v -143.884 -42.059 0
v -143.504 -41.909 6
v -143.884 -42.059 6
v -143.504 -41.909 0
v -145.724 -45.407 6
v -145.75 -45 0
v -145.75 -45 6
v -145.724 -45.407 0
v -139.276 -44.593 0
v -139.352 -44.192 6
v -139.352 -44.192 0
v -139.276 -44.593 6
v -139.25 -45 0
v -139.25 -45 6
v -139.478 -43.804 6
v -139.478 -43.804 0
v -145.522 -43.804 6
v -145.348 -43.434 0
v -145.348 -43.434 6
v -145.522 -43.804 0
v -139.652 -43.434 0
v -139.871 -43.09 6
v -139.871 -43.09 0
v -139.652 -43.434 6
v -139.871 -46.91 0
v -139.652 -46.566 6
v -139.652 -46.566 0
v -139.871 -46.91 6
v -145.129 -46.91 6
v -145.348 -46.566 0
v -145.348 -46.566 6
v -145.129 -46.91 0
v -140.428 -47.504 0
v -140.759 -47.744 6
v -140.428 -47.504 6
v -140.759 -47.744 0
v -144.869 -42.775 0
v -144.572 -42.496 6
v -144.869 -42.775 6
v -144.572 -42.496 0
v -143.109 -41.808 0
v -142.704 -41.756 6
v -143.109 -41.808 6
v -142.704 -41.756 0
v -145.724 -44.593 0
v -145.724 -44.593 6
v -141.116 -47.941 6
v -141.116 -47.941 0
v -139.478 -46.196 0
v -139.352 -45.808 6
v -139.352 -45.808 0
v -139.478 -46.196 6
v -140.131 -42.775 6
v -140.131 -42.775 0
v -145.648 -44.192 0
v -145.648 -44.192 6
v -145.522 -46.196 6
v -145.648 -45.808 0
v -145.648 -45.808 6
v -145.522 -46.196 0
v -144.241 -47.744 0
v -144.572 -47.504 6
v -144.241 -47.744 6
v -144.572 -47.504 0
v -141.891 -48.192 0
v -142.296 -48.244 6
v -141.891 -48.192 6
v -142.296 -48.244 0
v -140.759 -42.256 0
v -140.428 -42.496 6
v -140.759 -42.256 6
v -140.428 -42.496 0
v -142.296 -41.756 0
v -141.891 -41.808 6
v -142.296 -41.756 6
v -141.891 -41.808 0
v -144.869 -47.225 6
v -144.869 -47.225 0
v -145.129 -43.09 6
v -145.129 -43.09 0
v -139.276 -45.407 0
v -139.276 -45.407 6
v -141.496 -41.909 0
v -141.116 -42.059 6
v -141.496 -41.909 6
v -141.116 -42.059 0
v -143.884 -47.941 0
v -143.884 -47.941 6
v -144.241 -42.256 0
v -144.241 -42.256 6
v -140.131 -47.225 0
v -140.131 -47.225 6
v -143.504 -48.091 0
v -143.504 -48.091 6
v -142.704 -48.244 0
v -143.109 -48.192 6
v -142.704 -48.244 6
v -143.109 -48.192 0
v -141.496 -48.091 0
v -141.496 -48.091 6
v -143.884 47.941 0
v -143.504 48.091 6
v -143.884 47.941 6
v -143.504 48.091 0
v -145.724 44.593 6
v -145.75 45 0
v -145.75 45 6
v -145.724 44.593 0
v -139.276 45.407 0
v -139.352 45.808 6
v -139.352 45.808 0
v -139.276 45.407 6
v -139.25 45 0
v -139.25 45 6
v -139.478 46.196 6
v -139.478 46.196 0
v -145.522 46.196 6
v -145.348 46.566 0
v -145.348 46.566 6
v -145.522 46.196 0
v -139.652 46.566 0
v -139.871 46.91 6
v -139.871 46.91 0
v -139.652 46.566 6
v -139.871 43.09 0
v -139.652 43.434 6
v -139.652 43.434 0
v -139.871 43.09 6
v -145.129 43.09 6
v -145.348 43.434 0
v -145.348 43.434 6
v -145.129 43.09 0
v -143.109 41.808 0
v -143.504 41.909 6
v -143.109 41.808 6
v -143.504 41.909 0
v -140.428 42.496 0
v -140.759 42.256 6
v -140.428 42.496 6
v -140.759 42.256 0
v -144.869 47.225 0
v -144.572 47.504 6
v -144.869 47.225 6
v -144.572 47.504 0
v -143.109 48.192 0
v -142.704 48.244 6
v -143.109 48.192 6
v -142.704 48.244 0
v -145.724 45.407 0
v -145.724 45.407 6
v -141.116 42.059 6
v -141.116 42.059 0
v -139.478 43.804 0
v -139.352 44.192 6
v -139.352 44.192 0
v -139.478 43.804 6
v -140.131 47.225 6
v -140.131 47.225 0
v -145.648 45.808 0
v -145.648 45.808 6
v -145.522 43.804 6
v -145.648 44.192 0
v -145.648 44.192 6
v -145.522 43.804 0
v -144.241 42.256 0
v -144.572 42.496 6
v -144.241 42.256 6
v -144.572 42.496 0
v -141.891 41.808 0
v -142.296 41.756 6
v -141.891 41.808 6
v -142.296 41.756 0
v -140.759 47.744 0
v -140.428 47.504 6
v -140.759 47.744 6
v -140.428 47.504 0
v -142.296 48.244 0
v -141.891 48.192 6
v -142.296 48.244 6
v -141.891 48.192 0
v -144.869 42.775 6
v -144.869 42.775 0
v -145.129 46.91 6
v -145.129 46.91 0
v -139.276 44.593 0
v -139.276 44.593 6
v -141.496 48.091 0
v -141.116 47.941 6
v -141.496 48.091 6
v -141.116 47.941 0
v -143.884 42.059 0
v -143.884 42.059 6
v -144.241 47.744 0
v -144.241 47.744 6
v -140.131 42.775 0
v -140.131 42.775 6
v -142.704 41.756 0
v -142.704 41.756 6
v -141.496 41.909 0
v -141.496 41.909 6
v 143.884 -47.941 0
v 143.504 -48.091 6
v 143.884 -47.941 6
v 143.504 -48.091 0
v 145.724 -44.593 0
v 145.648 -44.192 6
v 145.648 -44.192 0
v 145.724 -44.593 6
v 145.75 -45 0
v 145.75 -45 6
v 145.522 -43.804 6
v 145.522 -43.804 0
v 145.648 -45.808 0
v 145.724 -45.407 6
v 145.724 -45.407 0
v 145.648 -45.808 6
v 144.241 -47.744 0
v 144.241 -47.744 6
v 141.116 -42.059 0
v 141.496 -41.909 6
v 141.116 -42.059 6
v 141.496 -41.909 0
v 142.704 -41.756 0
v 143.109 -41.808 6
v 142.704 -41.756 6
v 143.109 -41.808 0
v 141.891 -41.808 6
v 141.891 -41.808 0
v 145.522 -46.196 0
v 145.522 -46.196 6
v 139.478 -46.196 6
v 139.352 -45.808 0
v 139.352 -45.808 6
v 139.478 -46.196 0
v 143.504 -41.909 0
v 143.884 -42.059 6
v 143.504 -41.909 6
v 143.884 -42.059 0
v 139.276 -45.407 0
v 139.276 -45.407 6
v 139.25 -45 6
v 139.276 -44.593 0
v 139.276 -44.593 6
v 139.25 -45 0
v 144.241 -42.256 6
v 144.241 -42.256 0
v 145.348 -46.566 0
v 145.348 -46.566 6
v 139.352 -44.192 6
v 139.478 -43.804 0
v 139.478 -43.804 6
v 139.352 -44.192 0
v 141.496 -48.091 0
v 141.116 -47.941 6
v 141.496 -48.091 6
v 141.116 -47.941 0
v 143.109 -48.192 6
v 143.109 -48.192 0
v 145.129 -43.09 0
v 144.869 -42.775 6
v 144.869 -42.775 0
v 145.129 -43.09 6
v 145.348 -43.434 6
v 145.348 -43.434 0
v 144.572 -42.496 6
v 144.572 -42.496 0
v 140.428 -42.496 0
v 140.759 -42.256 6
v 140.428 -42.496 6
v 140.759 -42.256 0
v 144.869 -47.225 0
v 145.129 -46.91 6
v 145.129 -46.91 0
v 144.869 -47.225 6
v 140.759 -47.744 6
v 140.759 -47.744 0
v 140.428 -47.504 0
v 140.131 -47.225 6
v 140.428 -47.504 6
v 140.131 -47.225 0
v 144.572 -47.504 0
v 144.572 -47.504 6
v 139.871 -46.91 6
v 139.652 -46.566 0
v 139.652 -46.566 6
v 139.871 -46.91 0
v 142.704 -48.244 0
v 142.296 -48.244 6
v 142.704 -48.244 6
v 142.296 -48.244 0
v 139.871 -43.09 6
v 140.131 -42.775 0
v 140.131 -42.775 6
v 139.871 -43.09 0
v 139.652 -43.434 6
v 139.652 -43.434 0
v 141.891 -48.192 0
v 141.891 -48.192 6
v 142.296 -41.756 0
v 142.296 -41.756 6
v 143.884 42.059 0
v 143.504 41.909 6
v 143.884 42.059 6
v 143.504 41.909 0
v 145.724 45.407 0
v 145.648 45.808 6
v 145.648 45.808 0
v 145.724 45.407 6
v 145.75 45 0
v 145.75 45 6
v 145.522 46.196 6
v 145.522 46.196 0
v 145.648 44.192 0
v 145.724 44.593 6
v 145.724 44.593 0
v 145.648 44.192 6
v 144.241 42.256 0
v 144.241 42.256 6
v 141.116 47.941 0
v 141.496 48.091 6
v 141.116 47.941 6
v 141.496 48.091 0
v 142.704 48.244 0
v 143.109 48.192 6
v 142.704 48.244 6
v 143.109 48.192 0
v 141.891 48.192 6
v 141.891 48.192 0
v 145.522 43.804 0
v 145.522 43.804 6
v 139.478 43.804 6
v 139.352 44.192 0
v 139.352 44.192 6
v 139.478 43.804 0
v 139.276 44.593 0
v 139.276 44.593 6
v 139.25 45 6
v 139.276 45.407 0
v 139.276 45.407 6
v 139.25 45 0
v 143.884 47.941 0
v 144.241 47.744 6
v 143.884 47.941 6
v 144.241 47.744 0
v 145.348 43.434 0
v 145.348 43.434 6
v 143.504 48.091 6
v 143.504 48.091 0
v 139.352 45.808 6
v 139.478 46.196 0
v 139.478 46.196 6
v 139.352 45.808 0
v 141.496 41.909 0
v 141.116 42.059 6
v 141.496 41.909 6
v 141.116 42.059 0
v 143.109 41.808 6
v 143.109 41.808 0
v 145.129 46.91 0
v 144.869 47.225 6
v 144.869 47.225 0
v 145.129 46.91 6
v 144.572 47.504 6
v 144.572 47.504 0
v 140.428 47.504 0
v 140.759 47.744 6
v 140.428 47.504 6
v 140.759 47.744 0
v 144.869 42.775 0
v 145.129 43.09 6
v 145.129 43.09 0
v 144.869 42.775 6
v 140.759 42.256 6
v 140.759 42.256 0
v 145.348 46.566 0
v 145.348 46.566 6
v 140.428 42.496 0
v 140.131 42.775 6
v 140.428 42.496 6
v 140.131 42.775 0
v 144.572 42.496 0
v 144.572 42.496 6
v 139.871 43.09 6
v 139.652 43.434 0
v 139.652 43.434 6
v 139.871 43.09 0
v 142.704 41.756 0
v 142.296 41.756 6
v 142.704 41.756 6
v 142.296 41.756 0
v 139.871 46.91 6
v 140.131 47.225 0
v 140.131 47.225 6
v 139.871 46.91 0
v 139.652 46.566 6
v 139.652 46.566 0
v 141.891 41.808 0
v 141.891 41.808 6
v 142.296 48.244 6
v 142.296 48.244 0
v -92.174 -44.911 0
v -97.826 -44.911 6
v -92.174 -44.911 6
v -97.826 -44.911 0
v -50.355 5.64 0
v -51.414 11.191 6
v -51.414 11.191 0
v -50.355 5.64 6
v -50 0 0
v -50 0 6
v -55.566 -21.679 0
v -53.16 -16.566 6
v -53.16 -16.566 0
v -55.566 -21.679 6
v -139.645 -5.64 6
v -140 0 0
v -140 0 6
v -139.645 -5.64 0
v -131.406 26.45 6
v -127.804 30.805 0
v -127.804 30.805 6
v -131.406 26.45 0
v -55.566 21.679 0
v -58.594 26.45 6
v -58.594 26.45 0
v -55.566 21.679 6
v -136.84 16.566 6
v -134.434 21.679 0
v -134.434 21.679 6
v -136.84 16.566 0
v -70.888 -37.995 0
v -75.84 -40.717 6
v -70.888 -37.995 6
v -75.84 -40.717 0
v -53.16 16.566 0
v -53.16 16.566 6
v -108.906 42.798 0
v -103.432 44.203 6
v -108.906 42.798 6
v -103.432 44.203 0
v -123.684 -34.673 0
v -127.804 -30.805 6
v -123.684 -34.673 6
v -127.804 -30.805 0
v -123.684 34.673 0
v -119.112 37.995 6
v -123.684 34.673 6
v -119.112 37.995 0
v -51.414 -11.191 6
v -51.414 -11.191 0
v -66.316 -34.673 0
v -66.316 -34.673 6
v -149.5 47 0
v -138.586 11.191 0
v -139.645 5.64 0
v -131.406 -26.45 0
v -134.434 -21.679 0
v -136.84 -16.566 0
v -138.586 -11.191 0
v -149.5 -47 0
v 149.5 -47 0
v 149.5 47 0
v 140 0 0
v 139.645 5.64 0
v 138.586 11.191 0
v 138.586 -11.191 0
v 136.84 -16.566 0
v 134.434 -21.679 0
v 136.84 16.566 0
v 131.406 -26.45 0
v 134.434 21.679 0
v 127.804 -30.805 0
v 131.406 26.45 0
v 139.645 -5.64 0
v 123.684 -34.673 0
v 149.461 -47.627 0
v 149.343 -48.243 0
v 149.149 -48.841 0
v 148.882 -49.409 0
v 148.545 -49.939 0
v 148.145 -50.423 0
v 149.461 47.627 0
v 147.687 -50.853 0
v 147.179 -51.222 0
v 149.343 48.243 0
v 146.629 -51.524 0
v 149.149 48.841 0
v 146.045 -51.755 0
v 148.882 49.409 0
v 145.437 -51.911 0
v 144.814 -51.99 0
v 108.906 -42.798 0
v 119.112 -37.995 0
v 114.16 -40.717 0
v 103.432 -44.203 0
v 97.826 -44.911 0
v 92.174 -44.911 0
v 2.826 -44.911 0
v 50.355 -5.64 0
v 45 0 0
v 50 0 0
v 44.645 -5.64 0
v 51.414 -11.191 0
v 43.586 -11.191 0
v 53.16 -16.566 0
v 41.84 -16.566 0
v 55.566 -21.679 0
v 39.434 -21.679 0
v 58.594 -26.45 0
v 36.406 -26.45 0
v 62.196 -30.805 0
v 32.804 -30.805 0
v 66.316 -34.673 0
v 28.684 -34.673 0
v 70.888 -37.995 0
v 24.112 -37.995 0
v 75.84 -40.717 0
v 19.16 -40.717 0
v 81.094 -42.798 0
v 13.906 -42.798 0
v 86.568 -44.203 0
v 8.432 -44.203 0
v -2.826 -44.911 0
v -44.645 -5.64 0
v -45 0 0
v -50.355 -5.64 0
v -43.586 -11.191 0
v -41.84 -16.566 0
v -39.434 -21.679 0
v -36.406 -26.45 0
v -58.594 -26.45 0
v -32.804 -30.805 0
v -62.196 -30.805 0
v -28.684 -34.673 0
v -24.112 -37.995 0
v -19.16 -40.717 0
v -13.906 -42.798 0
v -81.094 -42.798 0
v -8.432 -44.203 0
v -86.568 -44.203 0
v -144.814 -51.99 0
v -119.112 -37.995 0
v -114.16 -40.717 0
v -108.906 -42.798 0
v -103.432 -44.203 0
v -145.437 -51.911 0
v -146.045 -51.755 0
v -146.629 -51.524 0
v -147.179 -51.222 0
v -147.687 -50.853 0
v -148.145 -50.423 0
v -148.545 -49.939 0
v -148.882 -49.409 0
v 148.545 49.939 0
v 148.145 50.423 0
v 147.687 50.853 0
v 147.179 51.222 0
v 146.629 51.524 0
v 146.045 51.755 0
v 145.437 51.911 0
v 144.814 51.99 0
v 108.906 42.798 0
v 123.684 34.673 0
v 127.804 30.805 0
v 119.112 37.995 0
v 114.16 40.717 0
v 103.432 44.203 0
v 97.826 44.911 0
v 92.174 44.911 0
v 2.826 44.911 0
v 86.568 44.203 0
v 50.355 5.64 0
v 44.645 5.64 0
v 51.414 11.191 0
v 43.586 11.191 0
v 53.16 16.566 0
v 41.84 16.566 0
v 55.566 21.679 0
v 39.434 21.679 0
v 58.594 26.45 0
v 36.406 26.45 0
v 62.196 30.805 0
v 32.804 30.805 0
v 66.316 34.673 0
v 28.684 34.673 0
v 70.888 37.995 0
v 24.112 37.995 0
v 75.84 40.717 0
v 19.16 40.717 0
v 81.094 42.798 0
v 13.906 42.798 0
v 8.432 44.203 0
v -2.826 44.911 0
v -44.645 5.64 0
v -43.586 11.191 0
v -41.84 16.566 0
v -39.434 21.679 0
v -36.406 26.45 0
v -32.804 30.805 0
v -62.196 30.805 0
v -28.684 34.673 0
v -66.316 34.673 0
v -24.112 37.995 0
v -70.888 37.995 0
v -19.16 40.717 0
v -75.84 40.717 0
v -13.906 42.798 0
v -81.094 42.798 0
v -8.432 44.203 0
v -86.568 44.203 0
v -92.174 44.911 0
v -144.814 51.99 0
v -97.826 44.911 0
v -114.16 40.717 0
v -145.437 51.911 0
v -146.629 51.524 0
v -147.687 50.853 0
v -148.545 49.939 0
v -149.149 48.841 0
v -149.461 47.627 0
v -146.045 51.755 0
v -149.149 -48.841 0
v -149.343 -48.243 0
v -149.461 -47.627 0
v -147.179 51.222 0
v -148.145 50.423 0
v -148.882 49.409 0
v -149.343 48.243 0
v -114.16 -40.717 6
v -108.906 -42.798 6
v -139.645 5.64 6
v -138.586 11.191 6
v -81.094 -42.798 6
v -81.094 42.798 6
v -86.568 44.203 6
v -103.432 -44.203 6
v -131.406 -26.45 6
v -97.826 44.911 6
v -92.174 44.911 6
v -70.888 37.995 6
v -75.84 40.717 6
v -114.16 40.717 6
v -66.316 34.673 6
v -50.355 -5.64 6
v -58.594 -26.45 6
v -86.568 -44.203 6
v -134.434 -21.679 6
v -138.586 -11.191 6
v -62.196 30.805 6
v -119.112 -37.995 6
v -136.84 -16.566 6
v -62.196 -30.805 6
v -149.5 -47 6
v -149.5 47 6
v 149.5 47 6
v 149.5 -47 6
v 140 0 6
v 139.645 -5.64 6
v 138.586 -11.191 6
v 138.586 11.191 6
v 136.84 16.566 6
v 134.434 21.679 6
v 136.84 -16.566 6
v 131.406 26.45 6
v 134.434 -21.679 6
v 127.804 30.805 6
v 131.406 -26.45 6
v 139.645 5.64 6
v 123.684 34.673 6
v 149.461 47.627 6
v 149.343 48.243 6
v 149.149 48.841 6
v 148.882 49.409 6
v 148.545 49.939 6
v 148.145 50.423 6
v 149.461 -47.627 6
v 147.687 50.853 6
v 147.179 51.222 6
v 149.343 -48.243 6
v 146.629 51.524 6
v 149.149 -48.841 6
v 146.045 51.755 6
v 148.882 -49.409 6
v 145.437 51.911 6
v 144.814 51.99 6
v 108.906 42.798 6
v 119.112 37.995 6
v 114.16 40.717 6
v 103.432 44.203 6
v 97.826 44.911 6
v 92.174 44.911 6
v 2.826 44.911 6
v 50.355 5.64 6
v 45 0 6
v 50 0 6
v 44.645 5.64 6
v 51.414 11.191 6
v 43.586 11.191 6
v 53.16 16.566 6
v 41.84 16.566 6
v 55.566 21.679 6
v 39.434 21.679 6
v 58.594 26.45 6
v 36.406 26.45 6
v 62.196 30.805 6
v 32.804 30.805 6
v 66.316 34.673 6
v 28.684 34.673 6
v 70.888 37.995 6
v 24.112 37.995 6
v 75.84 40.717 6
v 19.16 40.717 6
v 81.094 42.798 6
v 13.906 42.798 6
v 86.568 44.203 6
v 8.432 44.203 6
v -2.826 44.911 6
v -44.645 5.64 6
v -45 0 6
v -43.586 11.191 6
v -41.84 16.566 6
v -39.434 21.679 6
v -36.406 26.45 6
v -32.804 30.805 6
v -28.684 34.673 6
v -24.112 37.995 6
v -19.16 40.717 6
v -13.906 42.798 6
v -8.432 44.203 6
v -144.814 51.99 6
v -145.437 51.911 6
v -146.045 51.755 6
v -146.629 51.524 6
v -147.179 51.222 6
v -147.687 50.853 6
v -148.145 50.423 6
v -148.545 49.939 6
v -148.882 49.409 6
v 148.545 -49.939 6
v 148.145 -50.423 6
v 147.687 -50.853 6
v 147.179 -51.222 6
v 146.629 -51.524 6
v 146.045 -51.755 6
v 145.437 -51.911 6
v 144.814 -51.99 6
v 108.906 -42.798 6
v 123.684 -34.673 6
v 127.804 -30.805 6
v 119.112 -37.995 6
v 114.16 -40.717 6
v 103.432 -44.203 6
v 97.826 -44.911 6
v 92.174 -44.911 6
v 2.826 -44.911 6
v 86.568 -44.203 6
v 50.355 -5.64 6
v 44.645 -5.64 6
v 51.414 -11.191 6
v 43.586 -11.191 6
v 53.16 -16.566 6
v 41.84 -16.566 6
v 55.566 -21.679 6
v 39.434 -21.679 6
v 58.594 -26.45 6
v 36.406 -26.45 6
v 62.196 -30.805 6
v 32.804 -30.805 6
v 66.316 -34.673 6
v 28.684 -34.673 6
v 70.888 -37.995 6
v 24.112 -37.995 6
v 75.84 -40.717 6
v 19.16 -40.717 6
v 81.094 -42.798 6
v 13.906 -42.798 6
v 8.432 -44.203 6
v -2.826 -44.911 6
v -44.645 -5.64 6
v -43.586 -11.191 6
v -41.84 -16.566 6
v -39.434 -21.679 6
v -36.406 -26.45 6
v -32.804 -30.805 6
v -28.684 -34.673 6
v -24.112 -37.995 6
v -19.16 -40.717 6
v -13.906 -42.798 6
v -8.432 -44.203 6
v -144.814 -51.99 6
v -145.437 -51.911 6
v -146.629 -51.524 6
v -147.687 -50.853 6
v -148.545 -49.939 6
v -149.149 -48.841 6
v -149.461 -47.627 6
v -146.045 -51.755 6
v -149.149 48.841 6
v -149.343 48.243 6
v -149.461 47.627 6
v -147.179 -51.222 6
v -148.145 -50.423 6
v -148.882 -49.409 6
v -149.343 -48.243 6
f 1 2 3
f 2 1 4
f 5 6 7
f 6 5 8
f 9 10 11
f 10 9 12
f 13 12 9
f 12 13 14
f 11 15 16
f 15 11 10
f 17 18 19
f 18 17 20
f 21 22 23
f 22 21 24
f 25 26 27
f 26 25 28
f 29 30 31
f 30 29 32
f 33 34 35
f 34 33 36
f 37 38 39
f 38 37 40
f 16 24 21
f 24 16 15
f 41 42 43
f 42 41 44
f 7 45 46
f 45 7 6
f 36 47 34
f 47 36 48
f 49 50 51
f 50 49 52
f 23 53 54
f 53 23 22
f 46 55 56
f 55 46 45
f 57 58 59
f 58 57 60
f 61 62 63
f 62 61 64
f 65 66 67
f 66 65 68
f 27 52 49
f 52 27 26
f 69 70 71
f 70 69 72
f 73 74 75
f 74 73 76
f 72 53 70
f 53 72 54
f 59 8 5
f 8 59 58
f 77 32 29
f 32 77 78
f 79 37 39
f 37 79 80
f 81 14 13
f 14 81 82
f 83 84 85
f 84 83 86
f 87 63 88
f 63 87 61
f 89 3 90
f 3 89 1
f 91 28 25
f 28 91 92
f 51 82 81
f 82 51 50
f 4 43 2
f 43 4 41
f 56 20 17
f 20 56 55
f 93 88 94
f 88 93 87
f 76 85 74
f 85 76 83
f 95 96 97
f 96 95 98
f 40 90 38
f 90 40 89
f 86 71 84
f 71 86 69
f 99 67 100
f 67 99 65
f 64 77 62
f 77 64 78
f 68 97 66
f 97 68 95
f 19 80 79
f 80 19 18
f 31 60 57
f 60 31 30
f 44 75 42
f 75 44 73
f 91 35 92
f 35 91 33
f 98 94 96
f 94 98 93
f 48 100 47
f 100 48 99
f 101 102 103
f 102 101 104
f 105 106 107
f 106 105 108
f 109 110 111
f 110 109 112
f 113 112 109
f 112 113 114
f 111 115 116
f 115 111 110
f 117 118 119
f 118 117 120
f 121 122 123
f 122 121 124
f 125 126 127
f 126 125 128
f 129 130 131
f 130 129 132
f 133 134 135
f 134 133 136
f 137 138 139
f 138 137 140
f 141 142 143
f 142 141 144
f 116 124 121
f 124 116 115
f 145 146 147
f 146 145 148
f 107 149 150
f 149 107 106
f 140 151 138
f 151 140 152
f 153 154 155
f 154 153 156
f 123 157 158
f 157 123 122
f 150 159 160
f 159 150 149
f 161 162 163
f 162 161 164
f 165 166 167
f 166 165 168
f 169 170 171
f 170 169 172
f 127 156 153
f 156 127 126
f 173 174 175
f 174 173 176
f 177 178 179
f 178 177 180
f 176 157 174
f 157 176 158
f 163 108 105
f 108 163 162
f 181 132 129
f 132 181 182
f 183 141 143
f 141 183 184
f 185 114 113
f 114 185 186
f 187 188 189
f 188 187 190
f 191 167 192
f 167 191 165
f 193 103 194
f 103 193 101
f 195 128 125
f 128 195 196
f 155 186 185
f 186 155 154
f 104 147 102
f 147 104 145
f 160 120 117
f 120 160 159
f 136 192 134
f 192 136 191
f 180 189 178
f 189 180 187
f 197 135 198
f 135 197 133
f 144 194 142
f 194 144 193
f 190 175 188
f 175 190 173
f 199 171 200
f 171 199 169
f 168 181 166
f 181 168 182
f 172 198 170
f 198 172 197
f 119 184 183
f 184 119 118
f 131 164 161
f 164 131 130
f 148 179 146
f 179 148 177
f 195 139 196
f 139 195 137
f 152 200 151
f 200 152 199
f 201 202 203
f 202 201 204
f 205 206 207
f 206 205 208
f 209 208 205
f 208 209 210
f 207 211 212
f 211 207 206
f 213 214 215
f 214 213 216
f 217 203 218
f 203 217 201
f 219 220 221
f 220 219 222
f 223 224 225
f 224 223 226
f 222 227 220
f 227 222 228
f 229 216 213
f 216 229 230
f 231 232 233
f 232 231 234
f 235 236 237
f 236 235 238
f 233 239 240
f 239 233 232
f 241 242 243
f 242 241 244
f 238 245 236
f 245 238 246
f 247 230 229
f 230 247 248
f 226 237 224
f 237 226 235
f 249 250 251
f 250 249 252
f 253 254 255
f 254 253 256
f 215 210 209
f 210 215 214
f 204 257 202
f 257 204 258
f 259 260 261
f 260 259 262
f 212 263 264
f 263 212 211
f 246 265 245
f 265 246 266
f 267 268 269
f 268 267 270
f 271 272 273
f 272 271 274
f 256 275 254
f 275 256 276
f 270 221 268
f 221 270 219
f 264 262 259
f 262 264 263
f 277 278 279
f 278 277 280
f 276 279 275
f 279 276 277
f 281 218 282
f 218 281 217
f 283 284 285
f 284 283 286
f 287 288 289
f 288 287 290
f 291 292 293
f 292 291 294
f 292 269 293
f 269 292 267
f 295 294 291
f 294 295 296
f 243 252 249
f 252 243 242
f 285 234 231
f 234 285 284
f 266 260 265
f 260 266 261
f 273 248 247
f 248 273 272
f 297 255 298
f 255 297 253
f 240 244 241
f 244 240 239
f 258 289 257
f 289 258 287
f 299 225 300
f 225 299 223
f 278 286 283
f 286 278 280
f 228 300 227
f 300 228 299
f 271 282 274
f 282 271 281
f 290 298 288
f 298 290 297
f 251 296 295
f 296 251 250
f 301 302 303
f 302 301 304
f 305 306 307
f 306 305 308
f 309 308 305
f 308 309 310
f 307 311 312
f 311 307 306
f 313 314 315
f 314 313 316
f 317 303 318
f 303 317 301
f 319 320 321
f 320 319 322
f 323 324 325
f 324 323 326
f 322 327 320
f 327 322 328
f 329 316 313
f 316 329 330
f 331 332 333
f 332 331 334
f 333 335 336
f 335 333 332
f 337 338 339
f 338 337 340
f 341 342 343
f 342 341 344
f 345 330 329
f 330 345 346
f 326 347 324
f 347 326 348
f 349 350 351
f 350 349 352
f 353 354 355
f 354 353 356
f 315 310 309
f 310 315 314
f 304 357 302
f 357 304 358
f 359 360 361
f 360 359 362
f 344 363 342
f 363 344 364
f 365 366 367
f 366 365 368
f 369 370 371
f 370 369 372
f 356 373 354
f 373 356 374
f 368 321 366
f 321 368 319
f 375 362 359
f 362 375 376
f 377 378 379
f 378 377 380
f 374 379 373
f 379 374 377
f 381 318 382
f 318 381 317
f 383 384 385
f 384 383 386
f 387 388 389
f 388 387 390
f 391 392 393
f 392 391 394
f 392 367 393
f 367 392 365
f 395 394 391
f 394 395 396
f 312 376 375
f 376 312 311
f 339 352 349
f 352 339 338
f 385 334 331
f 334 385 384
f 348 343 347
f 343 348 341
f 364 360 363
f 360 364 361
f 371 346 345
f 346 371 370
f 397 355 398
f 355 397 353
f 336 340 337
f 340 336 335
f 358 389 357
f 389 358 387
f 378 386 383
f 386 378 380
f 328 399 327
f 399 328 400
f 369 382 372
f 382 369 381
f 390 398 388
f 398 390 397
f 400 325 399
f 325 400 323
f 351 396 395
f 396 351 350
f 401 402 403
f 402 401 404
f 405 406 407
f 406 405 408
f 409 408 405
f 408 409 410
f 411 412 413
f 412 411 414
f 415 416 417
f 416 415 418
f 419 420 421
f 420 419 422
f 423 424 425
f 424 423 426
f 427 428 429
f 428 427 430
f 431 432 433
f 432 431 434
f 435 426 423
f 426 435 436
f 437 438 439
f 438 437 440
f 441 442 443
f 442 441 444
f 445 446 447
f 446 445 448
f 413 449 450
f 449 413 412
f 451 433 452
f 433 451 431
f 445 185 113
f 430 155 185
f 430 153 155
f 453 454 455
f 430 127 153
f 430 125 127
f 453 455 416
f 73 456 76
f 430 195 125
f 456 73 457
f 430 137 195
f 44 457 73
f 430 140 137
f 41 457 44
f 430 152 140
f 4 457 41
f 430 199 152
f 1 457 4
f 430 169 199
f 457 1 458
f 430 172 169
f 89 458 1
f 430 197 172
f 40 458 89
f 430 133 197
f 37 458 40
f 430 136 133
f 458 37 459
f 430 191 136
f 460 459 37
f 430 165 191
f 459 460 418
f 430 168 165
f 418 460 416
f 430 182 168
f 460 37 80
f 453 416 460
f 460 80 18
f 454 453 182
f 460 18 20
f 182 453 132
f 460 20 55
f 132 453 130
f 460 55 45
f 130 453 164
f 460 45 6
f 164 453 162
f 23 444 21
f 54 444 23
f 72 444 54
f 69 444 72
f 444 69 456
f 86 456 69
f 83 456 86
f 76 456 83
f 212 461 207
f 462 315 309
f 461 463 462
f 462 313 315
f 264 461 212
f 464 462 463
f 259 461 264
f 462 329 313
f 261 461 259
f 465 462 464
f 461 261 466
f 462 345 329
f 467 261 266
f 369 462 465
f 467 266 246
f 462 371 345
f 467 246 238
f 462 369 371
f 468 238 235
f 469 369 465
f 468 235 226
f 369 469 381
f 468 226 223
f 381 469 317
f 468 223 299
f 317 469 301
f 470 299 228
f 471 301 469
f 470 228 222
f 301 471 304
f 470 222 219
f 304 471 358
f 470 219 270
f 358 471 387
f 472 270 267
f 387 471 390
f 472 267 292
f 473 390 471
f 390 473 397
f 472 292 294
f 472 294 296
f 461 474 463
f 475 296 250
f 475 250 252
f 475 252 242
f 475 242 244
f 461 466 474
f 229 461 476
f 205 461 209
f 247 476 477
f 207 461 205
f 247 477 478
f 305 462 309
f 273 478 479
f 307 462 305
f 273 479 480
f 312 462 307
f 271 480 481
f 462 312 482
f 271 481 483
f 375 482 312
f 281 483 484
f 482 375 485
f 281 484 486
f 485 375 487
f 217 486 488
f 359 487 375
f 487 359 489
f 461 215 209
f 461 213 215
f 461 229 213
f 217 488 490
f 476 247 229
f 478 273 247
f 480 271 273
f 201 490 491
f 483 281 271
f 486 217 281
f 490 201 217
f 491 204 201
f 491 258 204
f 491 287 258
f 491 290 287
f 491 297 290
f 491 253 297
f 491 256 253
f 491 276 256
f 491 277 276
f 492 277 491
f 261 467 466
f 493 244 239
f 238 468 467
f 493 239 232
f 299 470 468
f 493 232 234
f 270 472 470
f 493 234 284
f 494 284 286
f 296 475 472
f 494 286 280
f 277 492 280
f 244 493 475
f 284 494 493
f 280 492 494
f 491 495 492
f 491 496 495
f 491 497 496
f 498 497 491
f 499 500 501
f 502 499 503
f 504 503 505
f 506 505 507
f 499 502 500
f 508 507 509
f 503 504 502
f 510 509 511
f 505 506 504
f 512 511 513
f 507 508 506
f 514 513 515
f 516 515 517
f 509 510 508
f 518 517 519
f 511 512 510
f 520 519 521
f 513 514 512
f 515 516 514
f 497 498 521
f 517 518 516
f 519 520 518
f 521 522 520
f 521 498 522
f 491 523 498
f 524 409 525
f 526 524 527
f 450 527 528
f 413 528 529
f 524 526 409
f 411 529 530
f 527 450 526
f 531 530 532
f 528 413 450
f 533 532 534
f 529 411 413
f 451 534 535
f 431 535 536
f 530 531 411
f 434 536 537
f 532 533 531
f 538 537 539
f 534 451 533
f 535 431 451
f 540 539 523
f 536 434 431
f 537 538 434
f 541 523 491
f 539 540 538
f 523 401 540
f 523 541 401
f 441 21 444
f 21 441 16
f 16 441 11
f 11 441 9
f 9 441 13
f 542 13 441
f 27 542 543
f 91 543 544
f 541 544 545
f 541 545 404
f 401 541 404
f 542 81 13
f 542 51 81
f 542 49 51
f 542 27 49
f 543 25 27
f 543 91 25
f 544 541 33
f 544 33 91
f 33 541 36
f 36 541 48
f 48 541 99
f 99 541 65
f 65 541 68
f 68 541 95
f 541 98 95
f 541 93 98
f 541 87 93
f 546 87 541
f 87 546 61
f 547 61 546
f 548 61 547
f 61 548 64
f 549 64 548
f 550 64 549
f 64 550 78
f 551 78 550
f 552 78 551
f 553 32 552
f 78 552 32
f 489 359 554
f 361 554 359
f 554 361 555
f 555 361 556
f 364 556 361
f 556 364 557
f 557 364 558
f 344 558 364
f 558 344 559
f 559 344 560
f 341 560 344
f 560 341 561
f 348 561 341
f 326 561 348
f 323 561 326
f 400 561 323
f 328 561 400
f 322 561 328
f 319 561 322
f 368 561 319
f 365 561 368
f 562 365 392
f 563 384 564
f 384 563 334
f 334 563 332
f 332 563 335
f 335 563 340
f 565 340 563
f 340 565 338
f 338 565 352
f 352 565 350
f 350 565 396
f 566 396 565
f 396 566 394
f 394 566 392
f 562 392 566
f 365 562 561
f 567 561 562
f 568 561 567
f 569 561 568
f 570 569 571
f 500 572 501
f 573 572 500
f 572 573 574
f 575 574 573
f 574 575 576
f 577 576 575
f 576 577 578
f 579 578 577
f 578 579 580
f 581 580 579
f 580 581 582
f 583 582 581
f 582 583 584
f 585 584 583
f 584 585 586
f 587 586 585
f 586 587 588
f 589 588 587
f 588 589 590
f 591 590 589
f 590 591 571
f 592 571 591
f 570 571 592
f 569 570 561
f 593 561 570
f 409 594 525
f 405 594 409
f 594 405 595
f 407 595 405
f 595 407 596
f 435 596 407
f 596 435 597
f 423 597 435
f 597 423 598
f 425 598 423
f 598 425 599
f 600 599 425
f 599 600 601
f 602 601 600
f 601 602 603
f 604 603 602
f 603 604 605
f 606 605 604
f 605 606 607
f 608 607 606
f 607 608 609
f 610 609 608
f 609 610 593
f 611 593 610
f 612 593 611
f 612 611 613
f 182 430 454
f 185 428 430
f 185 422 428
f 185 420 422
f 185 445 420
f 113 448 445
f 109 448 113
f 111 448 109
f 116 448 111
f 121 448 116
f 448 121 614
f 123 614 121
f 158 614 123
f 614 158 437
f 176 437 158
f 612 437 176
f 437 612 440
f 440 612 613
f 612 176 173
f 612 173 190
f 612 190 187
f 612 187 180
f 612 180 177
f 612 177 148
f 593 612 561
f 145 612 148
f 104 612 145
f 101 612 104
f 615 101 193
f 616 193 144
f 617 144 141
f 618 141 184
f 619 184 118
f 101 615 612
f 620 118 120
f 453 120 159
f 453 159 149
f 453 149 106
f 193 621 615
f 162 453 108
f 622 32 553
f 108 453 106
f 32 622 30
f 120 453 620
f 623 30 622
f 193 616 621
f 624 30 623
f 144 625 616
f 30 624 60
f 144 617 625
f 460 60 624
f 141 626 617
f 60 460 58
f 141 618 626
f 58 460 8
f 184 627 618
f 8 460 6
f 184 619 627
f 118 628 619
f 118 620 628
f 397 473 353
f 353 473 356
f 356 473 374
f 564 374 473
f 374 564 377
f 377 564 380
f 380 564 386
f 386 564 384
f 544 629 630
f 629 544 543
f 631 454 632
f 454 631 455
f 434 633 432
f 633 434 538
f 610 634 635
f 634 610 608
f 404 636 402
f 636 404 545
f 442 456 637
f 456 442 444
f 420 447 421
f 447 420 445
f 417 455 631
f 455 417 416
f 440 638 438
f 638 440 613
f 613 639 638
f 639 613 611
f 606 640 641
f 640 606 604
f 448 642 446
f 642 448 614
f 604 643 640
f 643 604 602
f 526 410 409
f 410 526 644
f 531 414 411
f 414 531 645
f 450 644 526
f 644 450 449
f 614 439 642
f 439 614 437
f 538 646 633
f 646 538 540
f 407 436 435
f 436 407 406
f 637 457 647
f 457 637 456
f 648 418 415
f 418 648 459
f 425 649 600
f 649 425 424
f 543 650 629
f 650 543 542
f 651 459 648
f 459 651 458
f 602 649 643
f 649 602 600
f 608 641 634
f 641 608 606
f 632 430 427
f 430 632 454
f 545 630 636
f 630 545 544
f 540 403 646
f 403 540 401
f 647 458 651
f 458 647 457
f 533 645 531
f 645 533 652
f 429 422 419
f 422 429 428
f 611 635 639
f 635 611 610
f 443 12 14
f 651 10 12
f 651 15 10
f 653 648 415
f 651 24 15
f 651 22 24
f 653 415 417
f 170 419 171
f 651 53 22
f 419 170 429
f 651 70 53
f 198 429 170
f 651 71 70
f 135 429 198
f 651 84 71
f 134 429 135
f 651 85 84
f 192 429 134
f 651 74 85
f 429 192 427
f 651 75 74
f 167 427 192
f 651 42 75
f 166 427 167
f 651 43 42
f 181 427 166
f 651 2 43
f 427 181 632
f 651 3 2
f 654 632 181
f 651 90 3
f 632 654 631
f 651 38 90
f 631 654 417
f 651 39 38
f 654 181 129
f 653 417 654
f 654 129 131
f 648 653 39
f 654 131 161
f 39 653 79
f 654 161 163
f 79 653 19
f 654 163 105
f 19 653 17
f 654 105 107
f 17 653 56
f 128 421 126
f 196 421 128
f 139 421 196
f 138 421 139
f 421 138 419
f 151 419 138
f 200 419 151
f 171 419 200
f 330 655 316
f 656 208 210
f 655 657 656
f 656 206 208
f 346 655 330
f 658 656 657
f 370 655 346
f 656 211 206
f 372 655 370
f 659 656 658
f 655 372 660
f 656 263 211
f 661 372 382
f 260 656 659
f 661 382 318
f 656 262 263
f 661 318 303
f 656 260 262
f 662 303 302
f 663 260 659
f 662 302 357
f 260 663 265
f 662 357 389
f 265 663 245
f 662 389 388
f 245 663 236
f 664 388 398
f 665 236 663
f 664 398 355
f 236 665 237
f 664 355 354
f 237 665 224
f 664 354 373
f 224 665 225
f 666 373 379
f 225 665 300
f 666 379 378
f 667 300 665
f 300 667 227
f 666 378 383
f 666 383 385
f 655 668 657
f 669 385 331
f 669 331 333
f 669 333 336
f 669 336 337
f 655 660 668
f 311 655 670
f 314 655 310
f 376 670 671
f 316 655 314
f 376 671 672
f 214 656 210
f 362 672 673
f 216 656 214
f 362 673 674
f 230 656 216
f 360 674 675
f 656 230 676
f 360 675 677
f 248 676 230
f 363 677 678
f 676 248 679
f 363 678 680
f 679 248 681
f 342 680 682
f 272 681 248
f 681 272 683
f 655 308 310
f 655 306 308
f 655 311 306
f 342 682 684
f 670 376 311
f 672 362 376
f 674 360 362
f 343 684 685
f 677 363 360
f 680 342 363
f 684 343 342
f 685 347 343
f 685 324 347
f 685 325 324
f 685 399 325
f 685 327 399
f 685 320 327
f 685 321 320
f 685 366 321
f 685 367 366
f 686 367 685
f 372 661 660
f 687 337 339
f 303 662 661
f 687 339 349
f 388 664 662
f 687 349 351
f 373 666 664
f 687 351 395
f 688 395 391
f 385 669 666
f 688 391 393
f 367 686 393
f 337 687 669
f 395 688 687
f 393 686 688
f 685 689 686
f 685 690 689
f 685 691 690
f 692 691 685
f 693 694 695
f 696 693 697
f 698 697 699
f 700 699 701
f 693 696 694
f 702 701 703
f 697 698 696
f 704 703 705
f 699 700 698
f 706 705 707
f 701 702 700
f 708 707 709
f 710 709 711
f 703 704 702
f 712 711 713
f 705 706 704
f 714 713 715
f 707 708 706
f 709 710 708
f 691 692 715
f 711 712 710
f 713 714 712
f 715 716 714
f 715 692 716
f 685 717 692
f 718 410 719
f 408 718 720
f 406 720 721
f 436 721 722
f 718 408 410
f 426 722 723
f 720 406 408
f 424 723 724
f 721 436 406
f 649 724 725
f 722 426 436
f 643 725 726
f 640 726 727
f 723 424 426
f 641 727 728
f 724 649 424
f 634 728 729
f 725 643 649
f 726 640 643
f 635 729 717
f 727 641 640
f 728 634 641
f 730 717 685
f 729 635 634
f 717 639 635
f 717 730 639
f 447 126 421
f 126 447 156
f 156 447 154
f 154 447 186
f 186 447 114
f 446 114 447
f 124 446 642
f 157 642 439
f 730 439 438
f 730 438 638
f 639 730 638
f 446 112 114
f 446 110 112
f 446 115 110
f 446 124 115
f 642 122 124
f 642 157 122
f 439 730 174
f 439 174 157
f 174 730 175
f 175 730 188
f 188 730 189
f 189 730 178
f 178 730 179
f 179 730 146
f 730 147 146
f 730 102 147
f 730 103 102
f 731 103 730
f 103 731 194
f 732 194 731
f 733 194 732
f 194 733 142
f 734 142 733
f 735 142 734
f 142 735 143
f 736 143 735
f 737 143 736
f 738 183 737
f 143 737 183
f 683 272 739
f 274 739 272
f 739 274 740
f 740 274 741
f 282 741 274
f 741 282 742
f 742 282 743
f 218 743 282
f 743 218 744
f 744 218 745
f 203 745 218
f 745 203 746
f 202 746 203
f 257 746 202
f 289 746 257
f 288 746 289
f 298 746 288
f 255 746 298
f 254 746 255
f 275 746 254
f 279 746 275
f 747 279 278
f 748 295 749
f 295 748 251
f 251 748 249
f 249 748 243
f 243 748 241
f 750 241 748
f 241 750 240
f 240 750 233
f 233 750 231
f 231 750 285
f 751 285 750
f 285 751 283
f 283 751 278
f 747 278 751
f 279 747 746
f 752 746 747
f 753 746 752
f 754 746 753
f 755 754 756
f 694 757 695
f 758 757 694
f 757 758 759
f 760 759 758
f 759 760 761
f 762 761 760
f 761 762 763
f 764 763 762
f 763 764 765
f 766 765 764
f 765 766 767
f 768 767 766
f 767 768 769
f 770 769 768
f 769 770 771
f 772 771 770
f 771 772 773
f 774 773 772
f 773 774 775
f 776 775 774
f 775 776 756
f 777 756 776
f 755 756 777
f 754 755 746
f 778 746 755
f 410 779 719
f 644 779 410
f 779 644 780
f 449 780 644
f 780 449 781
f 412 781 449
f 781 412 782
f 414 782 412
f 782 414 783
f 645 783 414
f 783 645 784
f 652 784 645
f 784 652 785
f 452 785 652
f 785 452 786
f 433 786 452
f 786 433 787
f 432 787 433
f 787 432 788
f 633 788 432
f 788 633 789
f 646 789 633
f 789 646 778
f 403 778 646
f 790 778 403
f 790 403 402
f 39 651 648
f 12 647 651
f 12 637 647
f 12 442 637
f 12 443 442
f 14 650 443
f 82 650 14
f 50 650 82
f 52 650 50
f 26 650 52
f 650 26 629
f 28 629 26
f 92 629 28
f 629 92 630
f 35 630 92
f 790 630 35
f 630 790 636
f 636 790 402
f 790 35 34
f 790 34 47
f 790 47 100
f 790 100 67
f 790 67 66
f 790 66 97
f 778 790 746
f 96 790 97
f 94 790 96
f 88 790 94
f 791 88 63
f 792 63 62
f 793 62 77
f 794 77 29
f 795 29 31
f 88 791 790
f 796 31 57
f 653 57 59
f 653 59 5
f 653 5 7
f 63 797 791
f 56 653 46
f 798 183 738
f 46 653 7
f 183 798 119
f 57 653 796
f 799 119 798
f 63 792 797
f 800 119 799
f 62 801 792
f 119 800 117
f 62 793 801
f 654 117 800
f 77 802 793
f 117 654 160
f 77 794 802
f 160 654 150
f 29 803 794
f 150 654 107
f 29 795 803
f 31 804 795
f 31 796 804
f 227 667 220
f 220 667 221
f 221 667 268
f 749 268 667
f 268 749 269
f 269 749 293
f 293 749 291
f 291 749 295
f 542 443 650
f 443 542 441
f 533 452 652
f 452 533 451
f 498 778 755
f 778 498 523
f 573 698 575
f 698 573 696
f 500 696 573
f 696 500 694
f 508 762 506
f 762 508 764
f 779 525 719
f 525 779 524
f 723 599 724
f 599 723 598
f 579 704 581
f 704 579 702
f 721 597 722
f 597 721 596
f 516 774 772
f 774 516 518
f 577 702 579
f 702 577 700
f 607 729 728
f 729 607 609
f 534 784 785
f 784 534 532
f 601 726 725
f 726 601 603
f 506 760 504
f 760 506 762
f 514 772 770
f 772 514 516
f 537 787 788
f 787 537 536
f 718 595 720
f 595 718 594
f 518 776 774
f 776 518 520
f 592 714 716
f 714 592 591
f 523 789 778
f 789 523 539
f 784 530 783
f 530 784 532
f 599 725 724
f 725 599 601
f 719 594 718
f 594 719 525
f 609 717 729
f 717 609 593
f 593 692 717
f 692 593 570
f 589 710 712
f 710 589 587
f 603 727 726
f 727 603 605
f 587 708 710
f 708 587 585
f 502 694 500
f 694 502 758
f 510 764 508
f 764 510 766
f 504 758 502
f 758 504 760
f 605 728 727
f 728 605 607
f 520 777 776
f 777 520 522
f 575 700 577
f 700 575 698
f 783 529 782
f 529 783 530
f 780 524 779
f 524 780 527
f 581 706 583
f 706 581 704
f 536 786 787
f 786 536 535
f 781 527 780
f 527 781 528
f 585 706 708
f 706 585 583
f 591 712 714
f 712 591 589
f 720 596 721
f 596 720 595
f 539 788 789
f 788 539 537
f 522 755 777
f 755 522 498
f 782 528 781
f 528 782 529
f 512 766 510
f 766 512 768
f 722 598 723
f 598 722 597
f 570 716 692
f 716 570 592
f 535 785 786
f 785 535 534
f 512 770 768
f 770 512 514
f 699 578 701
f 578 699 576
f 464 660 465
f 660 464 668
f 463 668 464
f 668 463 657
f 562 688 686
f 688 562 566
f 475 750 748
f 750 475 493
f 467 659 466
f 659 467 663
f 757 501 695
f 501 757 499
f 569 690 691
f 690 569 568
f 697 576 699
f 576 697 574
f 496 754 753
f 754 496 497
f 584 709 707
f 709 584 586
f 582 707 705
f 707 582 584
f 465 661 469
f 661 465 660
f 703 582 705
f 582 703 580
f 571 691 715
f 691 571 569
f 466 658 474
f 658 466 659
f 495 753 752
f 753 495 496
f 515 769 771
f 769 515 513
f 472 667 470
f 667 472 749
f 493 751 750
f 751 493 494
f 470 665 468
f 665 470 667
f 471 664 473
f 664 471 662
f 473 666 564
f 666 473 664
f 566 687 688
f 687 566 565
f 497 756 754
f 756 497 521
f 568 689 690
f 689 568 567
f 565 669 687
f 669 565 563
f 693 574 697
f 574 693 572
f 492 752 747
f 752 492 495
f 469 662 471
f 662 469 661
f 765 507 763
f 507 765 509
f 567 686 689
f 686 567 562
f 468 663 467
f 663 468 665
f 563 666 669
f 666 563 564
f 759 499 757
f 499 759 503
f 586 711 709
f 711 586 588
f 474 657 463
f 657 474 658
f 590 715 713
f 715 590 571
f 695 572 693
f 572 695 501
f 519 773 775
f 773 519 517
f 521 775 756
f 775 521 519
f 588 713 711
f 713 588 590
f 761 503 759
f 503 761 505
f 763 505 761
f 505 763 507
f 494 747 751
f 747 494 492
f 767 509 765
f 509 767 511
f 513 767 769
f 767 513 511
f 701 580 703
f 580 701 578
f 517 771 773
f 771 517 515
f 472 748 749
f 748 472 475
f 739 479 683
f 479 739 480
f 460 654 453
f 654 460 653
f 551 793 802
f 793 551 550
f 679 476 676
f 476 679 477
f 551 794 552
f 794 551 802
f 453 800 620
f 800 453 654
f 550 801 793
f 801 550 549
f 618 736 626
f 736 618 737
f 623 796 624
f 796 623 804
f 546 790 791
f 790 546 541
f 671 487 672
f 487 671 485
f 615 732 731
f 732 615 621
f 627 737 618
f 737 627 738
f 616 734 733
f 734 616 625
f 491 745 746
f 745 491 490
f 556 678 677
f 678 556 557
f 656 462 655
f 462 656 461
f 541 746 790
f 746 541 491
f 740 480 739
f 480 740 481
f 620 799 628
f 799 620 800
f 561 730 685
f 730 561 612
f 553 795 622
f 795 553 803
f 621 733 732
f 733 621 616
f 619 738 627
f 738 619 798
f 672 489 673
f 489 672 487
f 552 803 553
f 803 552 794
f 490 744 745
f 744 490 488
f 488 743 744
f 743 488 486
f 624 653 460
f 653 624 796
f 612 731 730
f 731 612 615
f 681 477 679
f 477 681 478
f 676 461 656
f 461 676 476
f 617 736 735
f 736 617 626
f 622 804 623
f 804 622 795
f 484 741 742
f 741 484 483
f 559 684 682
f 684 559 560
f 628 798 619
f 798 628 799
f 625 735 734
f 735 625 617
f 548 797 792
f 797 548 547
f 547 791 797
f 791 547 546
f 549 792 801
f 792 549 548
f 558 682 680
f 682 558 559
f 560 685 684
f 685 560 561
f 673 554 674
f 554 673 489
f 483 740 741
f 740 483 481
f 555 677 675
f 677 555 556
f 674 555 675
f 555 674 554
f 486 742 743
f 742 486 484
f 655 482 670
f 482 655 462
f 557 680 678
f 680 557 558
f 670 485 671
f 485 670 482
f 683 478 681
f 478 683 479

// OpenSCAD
$fn = 50;

difference() {
	union() {
		hull() {
			translate(v = [-144.5, 47.0, 0]) {
				cylinder(h = 6, r = 5);
			}
			translate(v = [144.5, 47.0, 0]) {
				cylinder(h = 6, r = 5);
			}
			translate(v = [-144.5, -47.0, 0]) {
				cylinder(h = 6, r = 5);
			}
			translate(v = [144.5, -47.0, 0]) {
				cylinder(h = 6, r = 5);
			}
		}
	}
	union() {
		translate(v = [-142.5, -45.0, -100.0]) {
			cylinder(h = 200, r = 3.25);
		}
		translate(v = [-142.5, 45.0, -100.0]) {
			cylinder(h = 200, r = 3.25);
		}
		translate(v = [142.5, -45.0, -100.0]) {
			cylinder(h = 200, r = 3.25);
		}
		translate(v = [142.5, 45.0, -100.0]) {
			cylinder(h = 200, r = 3.25);
		}
		translate(v = [-142.5, -45.0, -100.0]) {
			cylinder(h = 200, r = 1.8);
		}
		translate(v = [-142.5, 45.0, -100.0]) {
			cylinder(h = 200, r = 1.8);
		}
		translate(v = [142.5, -45.0, -100.0]) {
			cylinder(h = 200, r = 1.8);
		}
		translate(v = [142.5, 45.0, -100.0]) {
			cylinder(h = 200, r = 1.8);
		}
		translate(v = [-95.0, 0, 0.0]) {
			cylinder(h = 6, r = 45.0);
		}
		cylinder(h = 6, r = 45.0);
		translate(v = [95.0, 0, 0.0]) {
			cylinder(h = 6, r = 45.0);
		}
	}
}
